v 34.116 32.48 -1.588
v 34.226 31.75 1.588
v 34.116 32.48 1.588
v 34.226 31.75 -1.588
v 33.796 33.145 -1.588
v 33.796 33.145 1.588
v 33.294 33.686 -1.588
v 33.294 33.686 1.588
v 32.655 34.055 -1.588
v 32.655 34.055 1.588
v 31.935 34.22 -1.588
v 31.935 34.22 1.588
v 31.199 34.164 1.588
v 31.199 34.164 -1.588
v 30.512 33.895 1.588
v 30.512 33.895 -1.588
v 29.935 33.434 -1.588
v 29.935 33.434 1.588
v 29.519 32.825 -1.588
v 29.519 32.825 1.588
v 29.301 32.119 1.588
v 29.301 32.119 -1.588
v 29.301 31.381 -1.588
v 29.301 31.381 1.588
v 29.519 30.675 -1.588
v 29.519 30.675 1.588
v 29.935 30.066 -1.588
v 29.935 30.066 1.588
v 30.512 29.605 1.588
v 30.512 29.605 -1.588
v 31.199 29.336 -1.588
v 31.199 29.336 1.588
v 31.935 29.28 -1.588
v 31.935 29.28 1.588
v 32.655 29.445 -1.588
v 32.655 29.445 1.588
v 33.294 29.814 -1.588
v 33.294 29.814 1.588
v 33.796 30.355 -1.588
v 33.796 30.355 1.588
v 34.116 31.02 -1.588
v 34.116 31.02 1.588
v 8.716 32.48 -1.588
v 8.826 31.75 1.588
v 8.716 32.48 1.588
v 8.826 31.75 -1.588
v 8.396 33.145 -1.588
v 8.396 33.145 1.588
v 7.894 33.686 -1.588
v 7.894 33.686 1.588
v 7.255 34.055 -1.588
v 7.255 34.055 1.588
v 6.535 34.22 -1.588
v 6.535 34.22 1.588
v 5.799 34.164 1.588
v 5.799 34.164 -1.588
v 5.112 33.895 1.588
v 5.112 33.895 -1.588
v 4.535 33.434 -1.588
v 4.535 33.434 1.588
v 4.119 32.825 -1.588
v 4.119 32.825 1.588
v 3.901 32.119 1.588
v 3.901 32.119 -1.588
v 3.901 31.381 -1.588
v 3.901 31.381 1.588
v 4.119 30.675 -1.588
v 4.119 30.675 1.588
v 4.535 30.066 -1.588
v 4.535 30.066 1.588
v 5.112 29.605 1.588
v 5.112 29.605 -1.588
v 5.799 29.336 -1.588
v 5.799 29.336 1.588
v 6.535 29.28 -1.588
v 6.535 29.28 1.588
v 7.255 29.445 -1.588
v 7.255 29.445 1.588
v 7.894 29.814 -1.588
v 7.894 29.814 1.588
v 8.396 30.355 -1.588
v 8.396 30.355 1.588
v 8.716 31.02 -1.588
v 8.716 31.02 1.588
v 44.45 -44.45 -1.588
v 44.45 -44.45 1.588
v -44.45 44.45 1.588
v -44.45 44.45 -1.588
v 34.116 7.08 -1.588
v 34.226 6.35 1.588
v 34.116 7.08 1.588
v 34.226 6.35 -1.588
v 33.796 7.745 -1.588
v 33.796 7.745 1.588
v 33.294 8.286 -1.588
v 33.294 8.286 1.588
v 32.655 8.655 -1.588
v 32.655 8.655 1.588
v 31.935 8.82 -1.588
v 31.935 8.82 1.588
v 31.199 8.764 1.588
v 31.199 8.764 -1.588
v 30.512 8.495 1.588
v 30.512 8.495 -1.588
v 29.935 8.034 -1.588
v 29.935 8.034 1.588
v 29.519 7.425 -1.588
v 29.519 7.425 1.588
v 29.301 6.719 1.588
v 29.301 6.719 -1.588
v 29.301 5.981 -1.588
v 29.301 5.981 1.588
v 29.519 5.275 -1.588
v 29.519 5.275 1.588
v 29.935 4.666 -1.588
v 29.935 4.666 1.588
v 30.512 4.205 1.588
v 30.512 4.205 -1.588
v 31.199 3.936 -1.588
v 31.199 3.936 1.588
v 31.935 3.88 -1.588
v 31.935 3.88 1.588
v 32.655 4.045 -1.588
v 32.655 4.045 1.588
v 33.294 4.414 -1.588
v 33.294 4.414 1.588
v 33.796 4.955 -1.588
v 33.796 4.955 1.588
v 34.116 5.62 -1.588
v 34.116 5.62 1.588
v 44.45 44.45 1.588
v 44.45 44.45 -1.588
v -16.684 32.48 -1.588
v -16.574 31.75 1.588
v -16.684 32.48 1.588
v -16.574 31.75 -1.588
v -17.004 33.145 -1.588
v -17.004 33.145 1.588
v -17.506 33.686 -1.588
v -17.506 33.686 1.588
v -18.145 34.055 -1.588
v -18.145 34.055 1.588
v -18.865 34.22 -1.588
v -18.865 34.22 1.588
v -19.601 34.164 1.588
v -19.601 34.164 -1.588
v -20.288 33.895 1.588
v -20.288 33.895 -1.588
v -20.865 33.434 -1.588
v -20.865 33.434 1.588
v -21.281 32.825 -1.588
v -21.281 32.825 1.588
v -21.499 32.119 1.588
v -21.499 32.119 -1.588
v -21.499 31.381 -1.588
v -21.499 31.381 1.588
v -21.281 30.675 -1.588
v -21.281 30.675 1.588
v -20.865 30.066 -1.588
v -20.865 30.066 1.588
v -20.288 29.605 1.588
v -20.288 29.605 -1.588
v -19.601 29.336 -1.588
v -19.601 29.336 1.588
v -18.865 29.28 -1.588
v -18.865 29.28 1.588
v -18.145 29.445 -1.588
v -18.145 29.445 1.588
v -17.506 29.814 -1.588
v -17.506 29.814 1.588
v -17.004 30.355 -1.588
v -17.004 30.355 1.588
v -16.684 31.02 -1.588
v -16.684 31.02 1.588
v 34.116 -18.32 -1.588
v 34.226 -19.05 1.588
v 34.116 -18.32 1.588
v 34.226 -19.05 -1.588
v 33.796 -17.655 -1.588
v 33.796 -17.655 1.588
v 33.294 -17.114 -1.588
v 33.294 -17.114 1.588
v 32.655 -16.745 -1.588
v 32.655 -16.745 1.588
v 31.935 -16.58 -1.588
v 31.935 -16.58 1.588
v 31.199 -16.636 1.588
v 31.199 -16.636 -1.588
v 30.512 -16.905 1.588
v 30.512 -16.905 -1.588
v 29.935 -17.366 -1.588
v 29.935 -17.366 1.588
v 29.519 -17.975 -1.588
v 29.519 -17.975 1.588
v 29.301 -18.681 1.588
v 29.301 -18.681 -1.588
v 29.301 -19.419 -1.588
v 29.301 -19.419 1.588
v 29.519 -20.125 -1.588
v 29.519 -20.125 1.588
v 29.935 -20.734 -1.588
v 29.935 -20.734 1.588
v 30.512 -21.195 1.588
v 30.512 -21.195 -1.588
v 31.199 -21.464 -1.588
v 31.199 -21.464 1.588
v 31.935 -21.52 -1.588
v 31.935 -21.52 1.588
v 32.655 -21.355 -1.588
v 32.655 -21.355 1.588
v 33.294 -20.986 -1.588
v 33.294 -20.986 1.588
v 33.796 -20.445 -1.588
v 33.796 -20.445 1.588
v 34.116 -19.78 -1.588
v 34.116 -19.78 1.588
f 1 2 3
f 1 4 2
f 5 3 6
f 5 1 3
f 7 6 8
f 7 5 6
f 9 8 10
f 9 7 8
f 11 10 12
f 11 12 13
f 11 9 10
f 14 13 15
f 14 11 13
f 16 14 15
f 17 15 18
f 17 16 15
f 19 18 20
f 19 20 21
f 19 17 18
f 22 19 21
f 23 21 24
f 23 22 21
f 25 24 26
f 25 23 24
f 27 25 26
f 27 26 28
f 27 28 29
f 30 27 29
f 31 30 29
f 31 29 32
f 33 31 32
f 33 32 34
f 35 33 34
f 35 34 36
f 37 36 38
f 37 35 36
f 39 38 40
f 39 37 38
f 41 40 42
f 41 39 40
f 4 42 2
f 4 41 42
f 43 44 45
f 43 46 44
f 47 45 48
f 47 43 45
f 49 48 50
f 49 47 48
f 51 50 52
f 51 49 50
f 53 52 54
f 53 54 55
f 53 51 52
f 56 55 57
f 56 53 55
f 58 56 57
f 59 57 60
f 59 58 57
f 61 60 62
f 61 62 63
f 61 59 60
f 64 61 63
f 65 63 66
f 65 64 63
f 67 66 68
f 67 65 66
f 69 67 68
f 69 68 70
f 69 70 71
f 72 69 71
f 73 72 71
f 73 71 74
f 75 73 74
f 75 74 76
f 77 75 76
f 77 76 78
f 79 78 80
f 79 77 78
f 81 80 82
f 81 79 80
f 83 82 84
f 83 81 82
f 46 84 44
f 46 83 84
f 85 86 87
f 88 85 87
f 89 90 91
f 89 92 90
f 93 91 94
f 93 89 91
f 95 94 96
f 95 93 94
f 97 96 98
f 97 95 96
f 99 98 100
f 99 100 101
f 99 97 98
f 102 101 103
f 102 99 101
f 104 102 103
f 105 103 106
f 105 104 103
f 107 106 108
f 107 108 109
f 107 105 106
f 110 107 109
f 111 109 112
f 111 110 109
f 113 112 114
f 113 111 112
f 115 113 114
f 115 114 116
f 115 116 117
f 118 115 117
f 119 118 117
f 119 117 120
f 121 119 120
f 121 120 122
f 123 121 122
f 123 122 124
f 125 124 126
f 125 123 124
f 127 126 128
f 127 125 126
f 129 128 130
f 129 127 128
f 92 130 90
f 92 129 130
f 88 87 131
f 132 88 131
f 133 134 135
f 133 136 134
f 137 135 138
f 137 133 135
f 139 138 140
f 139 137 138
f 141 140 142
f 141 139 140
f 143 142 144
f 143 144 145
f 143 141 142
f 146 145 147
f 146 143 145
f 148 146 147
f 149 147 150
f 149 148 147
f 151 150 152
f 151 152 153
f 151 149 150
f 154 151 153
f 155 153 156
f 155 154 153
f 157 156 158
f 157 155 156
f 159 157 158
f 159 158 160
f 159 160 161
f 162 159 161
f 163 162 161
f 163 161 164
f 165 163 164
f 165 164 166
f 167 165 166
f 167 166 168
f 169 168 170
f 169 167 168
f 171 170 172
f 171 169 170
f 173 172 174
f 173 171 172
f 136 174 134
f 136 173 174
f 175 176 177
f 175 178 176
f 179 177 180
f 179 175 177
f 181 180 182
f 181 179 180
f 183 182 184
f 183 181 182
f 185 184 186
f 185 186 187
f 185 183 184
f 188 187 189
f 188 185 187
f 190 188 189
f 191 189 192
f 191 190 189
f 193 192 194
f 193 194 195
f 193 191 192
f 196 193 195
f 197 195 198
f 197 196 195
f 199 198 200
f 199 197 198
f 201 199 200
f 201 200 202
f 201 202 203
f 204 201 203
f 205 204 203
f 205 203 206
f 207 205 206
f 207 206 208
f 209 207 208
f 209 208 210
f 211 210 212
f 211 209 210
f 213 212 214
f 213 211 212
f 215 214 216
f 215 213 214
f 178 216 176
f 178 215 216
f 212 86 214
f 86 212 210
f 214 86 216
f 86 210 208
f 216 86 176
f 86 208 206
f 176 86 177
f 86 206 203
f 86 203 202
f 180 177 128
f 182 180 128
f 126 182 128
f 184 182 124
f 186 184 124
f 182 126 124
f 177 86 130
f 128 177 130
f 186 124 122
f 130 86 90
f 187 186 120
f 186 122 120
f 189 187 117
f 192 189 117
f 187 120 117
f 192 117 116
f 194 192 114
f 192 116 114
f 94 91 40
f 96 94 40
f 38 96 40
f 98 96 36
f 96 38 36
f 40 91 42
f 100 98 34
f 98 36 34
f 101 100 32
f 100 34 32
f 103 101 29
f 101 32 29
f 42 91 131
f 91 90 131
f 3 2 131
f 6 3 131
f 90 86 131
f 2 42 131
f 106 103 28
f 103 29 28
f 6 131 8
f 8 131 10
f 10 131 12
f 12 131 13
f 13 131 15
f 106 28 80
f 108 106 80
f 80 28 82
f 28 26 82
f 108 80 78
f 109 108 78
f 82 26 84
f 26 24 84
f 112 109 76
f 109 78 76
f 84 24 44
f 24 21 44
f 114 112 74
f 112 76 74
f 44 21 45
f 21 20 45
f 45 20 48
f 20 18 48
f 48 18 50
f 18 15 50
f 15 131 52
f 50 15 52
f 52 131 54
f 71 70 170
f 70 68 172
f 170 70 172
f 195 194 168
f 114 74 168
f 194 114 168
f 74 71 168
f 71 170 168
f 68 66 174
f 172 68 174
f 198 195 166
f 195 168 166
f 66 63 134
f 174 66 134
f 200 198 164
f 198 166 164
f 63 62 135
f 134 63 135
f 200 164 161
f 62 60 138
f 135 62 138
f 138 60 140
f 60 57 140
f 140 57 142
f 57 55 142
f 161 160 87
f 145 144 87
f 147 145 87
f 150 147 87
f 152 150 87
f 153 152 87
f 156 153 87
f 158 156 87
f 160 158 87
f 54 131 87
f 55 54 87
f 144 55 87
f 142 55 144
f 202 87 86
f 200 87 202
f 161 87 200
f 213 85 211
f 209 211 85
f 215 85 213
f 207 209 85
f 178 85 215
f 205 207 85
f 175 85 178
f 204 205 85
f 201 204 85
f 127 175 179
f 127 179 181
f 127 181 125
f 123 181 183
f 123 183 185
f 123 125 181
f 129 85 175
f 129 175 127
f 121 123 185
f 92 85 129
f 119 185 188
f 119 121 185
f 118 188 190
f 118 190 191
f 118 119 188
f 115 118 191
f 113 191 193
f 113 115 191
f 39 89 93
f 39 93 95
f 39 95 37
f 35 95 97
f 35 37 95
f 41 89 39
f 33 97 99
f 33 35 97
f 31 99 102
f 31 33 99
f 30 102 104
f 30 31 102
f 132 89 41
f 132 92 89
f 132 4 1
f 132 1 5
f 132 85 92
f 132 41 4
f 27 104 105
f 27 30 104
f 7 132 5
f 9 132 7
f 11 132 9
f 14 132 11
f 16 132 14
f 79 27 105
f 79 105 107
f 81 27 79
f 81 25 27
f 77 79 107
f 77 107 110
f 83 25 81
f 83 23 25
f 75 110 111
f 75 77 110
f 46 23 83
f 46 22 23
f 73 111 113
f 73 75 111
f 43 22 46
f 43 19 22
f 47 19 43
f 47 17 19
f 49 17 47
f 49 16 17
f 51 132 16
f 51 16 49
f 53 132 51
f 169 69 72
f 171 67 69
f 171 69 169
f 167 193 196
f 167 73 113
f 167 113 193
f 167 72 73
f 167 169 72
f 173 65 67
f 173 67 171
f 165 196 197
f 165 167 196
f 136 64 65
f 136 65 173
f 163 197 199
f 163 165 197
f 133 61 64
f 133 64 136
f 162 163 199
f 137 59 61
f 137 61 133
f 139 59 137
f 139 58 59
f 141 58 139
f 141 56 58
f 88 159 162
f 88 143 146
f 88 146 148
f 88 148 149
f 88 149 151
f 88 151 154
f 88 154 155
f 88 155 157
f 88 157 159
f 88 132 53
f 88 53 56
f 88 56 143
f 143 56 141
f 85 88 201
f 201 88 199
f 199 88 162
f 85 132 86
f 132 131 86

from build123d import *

# Parameters (mm, degrees)
SKETCH1_R           = 2.4765
BOSS_EXTRUDE1_DEPTH = 1.5875


with BuildPart() as part:
    # Sketch1 → Boss-Extrude1 (new body, symmetric)
    with BuildSketch(Plane.XY):
        Polygon((-44.45, 44.45), (44.45, 44.45), (44.45, -44.45), align=None)
        with Locations((6.35, 31.75)):
            Circle(SKETCH1_R, mode=Mode.SUBTRACT)
        with Locations((31.75, 31.75)):
            Circle(SKETCH1_R, mode=Mode.SUBTRACT)
        with Locations((31.75, 6.35)):
            Circle(SKETCH1_R, mode=Mode.SUBTRACT)
        with Locations((31.75, -19.05)):
            Circle(SKETCH1_R, mode=Mode.SUBTRACT)
        with Locations((-19.05, 31.75)):
            Circle(SKETCH1_R, mode=Mode.SUBTRACT)
    extrude(amount=BOSS_EXTRUDE1_DEPTH, both=True)


solid = part.part
